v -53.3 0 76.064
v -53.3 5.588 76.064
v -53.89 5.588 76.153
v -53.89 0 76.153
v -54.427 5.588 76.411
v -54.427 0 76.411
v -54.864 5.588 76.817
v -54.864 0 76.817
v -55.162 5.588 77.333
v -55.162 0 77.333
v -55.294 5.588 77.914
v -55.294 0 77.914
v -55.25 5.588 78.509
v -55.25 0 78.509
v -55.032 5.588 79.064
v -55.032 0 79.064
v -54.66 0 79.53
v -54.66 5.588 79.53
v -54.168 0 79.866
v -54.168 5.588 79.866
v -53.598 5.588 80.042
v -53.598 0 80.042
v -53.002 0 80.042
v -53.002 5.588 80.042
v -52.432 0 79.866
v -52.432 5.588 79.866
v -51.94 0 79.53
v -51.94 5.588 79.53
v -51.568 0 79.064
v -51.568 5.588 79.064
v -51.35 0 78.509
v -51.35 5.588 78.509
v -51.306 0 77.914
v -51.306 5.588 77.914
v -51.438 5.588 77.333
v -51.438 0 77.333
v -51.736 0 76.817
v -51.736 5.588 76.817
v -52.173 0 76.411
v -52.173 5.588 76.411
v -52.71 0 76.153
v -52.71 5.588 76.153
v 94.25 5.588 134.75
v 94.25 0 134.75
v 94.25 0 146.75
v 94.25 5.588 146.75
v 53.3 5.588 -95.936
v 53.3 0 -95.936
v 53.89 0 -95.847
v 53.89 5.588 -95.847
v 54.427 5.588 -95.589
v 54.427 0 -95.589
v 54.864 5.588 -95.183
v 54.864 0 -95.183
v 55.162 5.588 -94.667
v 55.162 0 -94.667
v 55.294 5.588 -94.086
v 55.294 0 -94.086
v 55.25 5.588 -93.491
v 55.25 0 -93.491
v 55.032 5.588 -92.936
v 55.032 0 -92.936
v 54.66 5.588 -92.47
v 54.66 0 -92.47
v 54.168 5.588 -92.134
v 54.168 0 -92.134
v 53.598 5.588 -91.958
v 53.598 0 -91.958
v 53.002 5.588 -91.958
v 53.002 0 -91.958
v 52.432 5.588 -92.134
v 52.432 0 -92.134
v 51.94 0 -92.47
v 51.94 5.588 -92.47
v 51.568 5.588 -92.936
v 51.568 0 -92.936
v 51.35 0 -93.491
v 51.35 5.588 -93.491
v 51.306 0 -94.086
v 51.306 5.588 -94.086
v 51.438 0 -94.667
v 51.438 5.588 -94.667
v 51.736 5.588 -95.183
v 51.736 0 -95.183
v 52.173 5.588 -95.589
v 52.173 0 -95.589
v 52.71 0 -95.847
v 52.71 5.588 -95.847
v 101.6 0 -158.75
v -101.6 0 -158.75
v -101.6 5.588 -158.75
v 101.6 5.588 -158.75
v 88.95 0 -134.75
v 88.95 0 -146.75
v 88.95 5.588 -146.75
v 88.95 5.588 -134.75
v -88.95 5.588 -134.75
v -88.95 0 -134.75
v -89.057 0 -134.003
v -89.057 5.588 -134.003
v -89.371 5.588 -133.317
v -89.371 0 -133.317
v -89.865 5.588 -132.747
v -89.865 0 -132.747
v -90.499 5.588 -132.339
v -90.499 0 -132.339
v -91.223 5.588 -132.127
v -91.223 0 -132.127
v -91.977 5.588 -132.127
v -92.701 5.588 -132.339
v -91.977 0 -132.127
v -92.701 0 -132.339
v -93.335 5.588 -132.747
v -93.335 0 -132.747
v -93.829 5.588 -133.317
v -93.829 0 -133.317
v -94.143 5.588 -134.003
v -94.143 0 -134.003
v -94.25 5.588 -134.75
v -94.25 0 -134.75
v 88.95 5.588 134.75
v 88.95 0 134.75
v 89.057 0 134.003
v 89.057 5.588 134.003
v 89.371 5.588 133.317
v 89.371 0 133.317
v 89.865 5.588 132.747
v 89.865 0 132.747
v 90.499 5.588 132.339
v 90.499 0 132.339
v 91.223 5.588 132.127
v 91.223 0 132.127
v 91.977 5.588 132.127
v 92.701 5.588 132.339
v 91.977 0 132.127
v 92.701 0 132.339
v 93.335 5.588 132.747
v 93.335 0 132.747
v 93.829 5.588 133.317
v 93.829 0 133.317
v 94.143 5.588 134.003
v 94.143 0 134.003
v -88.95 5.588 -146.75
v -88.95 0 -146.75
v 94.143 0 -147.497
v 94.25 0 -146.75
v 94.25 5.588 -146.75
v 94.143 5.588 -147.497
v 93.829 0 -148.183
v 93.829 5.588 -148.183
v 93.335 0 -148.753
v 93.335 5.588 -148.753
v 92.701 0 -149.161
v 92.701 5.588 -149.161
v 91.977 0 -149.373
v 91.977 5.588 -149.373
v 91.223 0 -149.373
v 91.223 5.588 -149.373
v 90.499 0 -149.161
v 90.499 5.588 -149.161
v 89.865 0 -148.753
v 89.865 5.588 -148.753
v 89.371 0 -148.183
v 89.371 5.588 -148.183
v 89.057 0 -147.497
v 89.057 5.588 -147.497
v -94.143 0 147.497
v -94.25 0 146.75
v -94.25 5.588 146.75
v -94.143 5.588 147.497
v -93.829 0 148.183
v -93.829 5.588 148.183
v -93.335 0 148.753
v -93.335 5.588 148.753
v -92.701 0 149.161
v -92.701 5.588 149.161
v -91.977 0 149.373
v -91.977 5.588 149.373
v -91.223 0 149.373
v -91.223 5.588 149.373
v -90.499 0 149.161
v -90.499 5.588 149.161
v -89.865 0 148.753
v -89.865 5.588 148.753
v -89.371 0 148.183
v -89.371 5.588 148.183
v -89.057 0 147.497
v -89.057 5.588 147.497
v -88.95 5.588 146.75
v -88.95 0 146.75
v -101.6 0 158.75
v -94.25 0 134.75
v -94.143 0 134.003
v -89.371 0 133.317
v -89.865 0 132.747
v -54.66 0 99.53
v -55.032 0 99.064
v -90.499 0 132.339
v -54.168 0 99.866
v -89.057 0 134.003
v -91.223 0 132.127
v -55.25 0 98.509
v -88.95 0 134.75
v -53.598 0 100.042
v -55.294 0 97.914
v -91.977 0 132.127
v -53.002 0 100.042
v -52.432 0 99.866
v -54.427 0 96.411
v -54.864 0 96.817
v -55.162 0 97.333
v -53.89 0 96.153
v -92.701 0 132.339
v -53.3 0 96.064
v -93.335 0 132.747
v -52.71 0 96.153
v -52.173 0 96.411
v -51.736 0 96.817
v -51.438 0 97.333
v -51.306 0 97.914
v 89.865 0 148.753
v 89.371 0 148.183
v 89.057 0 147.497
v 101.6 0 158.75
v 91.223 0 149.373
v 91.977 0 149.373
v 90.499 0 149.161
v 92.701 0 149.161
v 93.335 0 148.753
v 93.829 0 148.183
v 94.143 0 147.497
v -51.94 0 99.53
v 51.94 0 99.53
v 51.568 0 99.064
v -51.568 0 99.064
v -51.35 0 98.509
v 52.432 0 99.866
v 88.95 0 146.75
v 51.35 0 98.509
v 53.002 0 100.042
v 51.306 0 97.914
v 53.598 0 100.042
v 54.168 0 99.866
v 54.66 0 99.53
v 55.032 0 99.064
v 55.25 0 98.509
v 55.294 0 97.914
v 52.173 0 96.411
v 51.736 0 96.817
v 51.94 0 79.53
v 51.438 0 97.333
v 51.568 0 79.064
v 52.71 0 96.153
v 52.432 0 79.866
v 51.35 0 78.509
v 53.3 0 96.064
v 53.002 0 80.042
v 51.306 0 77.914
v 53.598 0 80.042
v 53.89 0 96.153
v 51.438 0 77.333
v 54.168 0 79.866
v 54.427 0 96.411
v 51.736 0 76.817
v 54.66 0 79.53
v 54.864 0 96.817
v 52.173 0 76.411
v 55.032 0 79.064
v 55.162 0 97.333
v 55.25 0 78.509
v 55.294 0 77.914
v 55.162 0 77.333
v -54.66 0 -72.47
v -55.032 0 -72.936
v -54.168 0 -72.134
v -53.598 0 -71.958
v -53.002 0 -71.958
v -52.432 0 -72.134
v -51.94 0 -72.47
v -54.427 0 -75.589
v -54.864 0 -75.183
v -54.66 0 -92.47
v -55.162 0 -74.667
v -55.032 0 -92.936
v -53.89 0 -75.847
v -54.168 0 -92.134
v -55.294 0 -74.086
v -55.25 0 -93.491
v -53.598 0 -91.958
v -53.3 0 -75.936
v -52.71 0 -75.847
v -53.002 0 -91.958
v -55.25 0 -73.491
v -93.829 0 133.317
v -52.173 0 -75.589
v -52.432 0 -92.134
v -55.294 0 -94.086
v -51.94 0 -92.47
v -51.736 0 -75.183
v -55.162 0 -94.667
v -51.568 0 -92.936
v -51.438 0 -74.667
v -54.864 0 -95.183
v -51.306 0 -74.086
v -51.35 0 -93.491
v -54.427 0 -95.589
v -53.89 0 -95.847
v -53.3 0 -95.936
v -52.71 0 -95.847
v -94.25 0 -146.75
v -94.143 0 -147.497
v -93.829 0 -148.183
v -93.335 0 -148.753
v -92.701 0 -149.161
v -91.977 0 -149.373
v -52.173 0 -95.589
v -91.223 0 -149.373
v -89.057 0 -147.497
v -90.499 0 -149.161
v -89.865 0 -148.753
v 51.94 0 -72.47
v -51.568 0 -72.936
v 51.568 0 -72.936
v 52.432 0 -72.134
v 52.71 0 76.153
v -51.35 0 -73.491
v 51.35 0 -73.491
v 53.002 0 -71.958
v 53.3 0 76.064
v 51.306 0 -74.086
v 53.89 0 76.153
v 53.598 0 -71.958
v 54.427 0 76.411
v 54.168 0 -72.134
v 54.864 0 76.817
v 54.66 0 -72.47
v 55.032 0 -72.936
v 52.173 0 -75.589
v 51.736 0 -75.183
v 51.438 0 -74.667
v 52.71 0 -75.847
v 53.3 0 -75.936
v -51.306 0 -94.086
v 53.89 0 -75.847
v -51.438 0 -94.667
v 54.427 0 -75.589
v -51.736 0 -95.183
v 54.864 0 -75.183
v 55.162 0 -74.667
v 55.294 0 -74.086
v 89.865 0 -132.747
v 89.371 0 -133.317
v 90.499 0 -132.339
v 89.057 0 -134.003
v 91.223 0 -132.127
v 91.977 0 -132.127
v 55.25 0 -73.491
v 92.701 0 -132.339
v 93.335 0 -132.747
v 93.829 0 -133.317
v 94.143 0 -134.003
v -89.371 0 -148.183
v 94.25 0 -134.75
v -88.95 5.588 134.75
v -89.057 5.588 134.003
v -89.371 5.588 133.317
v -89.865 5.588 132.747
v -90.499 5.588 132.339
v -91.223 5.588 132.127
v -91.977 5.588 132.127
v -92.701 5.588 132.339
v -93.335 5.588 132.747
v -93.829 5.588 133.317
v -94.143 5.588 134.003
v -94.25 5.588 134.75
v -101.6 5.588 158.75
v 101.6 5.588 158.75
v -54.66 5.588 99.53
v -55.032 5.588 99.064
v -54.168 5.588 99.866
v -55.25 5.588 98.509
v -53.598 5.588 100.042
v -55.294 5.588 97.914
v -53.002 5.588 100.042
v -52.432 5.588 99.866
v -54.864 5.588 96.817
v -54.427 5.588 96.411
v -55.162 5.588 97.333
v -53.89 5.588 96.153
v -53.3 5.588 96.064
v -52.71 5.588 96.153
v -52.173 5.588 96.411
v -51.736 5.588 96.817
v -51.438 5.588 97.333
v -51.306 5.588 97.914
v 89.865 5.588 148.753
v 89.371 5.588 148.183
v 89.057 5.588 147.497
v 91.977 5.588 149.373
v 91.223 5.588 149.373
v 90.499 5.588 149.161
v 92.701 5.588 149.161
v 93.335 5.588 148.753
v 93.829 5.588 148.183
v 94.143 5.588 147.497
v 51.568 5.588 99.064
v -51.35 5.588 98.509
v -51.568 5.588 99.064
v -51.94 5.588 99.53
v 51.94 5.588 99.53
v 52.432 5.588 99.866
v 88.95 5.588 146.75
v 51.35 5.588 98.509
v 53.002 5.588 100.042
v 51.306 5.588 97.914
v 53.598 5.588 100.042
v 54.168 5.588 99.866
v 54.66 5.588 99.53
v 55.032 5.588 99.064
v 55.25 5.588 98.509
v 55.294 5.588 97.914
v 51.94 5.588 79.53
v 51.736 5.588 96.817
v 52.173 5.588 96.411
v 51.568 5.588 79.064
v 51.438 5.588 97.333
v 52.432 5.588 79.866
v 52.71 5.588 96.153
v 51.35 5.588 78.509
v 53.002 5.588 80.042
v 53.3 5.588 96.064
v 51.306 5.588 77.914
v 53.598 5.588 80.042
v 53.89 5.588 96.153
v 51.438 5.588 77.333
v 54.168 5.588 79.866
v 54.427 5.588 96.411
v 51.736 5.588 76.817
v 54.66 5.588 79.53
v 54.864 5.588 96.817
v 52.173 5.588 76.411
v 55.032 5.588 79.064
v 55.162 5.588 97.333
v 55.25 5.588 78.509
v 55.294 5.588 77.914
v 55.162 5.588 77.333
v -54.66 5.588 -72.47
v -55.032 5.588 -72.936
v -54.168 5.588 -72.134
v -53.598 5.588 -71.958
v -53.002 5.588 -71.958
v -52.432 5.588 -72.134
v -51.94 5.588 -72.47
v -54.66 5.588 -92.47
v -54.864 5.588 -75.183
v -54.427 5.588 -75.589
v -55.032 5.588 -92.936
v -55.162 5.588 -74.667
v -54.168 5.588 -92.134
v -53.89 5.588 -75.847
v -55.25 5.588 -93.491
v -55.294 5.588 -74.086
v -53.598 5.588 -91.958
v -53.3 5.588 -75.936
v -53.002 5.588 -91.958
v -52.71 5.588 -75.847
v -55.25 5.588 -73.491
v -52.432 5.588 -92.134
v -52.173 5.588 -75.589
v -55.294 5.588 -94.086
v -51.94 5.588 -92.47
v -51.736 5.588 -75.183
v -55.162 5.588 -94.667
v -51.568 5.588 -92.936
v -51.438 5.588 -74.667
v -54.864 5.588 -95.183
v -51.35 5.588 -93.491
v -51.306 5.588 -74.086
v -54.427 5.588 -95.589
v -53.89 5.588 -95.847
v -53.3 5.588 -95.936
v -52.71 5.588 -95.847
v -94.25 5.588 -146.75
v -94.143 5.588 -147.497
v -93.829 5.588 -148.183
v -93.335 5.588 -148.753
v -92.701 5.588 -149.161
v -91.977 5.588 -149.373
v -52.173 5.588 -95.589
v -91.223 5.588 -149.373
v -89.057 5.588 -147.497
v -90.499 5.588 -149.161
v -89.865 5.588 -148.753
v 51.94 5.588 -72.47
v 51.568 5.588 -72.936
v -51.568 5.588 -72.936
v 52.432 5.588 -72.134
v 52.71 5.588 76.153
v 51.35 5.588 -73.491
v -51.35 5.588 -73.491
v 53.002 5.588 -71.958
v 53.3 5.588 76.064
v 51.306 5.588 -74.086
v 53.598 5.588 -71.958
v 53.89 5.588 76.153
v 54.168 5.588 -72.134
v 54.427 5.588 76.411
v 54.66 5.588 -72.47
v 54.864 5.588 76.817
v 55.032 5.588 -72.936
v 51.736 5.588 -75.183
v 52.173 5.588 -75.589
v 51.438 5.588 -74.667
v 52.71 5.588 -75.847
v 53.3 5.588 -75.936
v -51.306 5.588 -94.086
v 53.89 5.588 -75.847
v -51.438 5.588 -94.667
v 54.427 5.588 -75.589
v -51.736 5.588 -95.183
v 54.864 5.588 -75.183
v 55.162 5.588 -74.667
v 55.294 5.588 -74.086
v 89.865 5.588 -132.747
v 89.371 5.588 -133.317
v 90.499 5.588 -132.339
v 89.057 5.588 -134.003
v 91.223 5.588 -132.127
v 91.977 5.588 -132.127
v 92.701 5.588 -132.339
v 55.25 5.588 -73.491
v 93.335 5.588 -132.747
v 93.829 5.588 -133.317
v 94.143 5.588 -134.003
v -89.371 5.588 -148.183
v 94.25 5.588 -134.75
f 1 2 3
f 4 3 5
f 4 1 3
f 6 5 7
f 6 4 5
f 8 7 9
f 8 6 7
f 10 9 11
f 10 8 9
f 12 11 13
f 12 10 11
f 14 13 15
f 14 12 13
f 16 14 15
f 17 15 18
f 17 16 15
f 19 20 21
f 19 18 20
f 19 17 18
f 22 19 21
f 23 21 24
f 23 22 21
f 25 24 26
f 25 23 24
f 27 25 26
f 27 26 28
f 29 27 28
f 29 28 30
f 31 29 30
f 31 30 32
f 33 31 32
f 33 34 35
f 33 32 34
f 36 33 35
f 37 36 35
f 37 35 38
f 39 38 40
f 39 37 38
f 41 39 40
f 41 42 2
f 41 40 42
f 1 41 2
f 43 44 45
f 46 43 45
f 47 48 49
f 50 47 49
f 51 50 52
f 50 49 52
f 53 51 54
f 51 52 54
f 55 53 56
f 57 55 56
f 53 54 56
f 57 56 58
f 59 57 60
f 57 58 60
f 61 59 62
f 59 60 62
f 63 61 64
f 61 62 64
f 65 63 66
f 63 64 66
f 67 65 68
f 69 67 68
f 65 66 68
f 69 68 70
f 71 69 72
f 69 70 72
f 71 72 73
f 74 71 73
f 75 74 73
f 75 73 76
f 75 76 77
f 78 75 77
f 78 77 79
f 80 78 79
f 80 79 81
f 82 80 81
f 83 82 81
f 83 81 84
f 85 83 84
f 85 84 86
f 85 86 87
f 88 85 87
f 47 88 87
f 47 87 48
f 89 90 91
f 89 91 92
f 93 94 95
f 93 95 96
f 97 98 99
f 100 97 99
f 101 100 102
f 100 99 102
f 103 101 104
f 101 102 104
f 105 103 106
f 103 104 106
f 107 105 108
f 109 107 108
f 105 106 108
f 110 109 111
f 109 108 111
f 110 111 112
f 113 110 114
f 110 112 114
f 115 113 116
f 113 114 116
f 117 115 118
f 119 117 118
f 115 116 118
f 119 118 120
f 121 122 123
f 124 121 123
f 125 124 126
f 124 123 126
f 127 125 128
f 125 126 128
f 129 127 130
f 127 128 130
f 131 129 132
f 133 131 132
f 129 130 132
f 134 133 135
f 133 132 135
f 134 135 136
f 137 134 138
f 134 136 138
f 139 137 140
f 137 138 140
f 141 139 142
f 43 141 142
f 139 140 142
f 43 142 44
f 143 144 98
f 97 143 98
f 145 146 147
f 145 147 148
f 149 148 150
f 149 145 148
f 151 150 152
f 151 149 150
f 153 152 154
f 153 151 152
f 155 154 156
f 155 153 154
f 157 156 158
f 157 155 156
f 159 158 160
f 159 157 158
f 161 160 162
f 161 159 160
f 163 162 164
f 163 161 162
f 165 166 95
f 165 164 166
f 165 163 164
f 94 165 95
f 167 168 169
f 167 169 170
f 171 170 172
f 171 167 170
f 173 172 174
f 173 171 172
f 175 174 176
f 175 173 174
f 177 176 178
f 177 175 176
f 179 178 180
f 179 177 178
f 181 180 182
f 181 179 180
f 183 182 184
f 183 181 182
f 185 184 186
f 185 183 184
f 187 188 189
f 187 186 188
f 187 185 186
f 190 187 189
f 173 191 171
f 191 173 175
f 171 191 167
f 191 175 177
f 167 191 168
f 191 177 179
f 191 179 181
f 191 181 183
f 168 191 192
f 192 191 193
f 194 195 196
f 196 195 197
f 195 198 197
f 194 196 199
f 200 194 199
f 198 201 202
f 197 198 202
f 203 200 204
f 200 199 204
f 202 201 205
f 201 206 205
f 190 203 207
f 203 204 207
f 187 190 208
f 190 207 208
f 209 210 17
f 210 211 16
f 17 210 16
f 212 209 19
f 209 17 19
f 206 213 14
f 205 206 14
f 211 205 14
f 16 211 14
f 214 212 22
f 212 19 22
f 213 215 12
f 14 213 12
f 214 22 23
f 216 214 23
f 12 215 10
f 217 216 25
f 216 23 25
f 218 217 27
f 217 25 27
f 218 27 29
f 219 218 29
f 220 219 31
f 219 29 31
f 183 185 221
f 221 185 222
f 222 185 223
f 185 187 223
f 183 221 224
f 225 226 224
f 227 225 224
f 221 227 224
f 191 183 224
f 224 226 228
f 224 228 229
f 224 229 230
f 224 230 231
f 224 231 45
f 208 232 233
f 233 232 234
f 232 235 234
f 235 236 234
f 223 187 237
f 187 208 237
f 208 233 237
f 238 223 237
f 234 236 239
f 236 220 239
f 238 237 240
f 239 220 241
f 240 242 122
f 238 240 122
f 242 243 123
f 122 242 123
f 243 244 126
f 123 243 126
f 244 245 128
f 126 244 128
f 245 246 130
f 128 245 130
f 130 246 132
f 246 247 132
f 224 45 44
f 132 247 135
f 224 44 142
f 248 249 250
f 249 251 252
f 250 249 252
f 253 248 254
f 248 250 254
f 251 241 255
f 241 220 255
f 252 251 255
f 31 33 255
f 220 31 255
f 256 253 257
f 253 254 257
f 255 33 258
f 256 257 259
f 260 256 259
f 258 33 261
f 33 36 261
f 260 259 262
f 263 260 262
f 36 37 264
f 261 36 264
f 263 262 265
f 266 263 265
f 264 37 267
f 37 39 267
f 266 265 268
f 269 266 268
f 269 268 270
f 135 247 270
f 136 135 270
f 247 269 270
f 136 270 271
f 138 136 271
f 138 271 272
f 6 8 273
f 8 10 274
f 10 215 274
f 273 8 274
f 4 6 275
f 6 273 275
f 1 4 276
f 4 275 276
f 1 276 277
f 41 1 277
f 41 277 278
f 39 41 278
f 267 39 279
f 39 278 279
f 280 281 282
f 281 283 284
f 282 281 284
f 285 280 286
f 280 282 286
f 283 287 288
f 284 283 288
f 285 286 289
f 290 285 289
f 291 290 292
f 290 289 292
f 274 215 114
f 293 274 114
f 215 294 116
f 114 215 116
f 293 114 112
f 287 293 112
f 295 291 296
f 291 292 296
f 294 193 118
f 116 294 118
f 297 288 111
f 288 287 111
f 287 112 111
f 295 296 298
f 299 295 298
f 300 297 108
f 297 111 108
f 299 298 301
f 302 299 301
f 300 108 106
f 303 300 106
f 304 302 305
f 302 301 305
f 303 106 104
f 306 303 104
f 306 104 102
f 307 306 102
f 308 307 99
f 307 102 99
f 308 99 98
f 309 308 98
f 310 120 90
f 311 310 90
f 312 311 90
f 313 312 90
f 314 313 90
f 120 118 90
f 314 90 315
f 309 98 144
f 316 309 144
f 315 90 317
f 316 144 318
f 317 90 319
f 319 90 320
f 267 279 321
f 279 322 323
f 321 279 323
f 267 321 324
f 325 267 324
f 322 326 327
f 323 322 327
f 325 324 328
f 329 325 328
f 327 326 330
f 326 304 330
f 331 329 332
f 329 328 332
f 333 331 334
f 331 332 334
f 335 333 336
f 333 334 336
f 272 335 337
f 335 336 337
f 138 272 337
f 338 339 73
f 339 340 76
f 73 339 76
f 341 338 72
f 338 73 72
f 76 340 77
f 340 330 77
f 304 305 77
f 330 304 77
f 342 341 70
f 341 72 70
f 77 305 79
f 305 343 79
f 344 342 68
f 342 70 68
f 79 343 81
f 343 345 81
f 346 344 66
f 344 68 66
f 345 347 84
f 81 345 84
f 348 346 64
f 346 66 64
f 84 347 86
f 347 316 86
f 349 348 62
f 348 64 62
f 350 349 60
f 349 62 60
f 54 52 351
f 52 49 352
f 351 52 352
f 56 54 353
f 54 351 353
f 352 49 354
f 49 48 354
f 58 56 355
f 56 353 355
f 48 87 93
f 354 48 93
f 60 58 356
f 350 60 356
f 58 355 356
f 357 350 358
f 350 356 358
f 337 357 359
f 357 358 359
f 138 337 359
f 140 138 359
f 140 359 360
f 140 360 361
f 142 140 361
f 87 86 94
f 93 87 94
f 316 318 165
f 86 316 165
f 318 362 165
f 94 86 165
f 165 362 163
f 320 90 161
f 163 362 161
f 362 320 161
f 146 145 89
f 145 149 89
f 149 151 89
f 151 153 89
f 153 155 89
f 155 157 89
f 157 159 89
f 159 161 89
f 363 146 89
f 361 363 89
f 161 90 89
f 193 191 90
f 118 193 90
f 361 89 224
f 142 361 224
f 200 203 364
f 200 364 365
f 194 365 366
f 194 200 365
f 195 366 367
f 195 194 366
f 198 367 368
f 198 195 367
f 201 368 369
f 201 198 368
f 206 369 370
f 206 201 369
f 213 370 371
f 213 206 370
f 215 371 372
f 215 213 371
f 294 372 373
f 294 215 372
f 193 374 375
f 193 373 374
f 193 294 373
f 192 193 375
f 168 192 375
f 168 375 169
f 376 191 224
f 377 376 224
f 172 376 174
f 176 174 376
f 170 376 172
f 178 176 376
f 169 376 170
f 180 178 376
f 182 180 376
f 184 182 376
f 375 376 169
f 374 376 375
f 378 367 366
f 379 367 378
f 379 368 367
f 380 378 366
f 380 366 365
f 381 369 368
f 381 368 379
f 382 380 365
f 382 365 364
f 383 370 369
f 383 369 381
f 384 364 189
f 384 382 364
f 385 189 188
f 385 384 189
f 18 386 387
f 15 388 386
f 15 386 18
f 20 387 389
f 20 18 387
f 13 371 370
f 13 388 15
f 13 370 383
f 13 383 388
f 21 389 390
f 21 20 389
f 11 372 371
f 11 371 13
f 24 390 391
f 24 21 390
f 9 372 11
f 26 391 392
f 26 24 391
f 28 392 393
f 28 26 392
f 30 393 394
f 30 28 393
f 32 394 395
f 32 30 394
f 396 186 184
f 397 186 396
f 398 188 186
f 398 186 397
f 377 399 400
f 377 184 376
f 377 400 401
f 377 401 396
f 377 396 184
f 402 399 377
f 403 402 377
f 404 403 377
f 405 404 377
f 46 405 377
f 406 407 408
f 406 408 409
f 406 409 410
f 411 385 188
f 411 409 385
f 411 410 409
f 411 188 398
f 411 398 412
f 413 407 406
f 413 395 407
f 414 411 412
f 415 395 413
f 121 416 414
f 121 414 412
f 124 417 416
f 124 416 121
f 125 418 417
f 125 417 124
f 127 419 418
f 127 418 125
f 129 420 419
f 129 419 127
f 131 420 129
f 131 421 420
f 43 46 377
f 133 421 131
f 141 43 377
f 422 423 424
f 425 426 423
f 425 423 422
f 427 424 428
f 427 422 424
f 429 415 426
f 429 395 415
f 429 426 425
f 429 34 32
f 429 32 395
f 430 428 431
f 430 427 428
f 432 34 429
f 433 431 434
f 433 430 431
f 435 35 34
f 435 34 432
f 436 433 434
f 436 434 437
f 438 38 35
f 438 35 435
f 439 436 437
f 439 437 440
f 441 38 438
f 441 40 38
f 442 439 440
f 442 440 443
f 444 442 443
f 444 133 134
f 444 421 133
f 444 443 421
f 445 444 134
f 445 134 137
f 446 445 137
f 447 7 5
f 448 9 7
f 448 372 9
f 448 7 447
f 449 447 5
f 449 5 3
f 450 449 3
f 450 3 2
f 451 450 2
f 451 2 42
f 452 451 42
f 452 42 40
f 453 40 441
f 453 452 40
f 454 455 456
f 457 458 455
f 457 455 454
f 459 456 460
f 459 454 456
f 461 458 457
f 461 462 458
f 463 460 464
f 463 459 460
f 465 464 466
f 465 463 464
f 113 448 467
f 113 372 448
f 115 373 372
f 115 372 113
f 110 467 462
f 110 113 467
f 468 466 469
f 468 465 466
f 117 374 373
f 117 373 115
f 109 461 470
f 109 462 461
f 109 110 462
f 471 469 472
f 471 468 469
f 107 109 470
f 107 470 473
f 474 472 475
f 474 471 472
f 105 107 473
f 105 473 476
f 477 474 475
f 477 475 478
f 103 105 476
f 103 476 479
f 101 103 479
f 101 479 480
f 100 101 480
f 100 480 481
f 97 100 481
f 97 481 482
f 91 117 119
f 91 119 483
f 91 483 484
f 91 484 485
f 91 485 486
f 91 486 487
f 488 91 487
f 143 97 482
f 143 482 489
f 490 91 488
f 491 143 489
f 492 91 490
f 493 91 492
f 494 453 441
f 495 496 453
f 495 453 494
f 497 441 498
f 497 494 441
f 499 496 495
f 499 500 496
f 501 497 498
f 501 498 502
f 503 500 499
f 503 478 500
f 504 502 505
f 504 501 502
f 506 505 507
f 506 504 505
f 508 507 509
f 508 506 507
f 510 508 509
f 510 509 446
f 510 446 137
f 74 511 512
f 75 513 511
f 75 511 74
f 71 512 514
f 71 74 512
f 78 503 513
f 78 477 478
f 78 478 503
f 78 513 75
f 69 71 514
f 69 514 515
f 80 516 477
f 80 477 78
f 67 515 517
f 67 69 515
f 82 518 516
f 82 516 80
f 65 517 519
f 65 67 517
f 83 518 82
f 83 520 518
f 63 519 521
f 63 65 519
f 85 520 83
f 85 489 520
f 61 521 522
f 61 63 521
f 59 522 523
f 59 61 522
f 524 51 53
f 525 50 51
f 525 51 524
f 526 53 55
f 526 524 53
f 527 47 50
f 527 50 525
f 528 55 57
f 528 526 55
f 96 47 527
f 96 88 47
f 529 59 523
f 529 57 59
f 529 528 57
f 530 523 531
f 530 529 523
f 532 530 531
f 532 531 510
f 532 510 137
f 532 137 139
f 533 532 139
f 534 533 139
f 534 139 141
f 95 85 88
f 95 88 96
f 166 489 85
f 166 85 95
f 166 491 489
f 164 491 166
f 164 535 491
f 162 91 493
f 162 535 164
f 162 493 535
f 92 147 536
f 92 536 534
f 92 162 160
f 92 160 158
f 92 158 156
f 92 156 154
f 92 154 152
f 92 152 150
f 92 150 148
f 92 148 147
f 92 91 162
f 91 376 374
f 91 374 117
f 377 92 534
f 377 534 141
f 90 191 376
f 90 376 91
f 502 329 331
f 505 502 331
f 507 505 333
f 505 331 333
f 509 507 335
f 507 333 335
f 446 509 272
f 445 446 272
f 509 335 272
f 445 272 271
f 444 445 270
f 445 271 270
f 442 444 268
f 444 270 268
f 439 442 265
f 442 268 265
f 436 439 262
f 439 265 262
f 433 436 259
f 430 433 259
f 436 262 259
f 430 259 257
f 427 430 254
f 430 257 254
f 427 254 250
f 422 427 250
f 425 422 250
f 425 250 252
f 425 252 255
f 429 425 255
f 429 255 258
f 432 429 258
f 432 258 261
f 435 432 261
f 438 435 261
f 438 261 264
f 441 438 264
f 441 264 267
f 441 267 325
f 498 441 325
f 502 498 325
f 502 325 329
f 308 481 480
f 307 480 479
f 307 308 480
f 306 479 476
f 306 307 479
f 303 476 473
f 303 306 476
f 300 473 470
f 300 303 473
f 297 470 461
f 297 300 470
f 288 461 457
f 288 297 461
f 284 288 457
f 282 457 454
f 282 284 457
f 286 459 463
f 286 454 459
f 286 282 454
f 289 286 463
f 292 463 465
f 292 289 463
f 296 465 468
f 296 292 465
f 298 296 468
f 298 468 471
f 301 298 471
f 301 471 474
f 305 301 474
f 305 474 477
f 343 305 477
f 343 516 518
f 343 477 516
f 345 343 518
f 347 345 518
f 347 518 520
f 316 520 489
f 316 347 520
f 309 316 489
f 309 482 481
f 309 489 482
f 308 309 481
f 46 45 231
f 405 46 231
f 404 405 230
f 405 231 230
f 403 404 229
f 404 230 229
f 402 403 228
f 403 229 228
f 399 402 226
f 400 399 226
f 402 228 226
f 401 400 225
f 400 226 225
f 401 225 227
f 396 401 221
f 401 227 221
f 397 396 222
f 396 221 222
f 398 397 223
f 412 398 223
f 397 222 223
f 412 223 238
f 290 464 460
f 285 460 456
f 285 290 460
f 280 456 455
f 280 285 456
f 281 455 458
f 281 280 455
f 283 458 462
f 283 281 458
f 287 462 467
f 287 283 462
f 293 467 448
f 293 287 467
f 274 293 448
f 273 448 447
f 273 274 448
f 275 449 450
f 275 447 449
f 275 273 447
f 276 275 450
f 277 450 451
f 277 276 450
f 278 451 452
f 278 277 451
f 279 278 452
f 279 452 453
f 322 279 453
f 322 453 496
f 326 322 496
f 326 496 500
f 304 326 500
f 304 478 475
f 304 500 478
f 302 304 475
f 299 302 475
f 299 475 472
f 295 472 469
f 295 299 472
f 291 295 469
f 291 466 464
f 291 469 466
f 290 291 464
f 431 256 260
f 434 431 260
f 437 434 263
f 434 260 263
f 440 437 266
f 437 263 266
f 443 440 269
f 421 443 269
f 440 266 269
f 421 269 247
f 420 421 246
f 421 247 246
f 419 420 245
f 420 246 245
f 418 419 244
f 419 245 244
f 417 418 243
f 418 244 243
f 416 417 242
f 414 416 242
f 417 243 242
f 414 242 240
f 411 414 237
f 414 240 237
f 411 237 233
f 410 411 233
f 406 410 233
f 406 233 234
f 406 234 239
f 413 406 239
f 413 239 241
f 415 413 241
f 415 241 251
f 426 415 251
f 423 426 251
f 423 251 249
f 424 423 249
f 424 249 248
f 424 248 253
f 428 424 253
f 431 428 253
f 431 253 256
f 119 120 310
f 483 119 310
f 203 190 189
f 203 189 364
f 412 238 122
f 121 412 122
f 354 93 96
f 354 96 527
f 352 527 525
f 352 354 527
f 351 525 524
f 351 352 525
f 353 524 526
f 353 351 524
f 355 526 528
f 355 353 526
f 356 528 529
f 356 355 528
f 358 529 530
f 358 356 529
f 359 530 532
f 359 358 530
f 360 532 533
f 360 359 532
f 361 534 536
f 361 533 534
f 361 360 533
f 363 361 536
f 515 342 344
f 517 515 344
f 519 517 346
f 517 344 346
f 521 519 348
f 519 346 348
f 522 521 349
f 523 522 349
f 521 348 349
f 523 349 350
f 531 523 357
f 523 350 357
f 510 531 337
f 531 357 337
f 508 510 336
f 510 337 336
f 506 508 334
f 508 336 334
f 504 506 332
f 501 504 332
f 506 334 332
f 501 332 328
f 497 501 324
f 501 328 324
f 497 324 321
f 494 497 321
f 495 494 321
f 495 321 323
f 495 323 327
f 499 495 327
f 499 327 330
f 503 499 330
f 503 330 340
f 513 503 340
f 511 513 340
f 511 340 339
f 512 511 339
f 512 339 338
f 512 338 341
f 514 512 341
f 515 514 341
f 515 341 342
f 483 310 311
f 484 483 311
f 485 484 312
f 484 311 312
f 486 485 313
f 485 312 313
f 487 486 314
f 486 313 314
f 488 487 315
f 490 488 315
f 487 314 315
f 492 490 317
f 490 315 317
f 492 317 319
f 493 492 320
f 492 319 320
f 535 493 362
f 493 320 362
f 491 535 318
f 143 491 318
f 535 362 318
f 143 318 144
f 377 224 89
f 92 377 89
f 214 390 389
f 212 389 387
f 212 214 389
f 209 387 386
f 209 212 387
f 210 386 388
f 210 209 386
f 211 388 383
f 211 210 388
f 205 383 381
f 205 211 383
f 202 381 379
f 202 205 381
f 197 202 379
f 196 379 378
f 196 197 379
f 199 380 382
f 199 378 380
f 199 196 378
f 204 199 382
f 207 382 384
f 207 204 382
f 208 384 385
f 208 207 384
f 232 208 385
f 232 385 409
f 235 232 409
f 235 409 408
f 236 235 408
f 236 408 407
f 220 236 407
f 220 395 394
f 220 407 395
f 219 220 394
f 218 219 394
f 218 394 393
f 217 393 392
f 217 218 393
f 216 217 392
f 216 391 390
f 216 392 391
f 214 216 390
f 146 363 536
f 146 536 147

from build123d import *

# Parameters (mm, degrees)
SKETCH1_W                                = 203.2
SKETCH1_H                                = 317.5
BOSS_EXTRUDE1_DEPTH                      = 5.588
SKETCH3_R                                = 2
SKETCH3_R_2                              = 2.000000004
CUT_EXTRUDE2_DEPTH                       = 468.664781924
SKETCH6_R                                = 2.65
CUT_EXTRUDE4_DEPTH                       = 468.664781924
CUT_EXTRUDE5_DEPTH                       = 189.561258598
MIRROR3_AT_THE_SECOND_PLANE_COPY_1_DEPTH = 189.561258598


with BuildPart() as part:
    # Sketch1 → Boss-Extrude1 (new body)
    with BuildSketch(Plane(origin=(0, 0, 0), x_dir=(1, 0, 0), z_dir=(0, 1, 0))):
        Rectangle(SKETCH1_W, SKETCH1_H)
    extrude(amount=BOSS_EXTRUDE1_DEPTH)

    # Sketch3 → Cut-Extrude2 (cut, through all)
    with BuildSketch(Plane(origin=(-338.26084164, 0, 0), x_dir=(1, 0, 0), z_dir=(0, -1, 0))):
        with Locations(Location((391.56084164, -93.936114691, 0), (0, 0, 270))):
            Circle(SKETCH3_R)
        with Locations(Location((391.56084164, -73.936114691, 0), (0, 0, 270))):
            Circle(SKETCH3_R)
        with Locations(Location((391.56084164, 78.063885309, 0), (0, 0, 270))):
            Circle(SKETCH3_R_2)
        with Locations(Location((391.56084164, 98.063885309, 0), (0, 0, 270))):
            Circle(SKETCH3_R)
    cut_extrude2 = extrude(amount=-CUT_EXTRUDE2_DEPTH, mode=Mode.SUBTRACT)

    # Mirror2: Cut-Extrude2 across plane
    add(cut_extrude2.mirror(Plane(origin=(0, 0, 0), x_dir=(0, 0, 1), z_dir=(1, 0, 0))), mode=Mode.SUBTRACT)

    # Sketch6 → Cut-Extrude4 (cut, through all)
    with BuildSketch(Plane(origin=(-338.26084164, 5.588, 0), x_dir=(1, 0, 0), z_dir=(0, 1, 0))):
        with Locations(Location((429.86084164, 136.812, 0), (0, 0, 270))):
            Circle(SKETCH6_R)
    extrude(amount=-CUT_EXTRUDE4_DEPTH, mode=Mode.SUBTRACT)

    # Sketch7 → Cut-Extrude5 (cut, through all)
    with BuildSketch(Plane.XZ):
        with BuildLine():
            Line((88.95, -146.75), (88.95, -134.75))
            ThreePointArc((88.95, -134.75), (91.6, -132.1), (94.25, -134.75))
            Line((94.25, -134.75), (94.25, -146.75))
            ThreePointArc((94.25, -146.75), (91.6, -149.4), (88.95, -146.75))
        make_face()
    cut_extrude5 = extrude(amount=-CUT_EXTRUDE5_DEPTH, mode=Mode.SUBTRACT)

    # Mirror3: Cut-Extrude5 across plane
    add(cut_extrude5.mirror(Plane(origin=(0, 0, 0), x_dir=(0, 0, 1), z_dir=(1, 0, 0))), mode=Mode.SUBTRACT)

    # Mirror3 at the second plane: Cut-Extrude5 across plane
    add(cut_extrude5.mirror(Plane.XY), mode=Mode.SUBTRACT)

    # Mirror3 at the second plane copy 1 sketc → Mirror3 at the second plane copy 1 (cut, through all)
    with BuildSketch(Plane(origin=(0, 0, 0), x_dir=(-1, 0, 0), z_dir=(0, -1, 0))):
        with BuildLine():
            Line((88.95, -146.75), (88.95, -134.75))
            ThreePointArc((88.95, -134.75), (91.6, -132.1), (94.25, -134.75))
            Line((94.25, -134.75), (94.25, -146.75))
            ThreePointArc((94.25, -146.75), (91.6, -149.4), (88.95, -146.75))
        make_face()
    extrude(amount=-MIRROR3_AT_THE_SECOND_PLANE_COPY_1_DEPTH, mode=Mode.SUBTRACT)


solid = part.part
